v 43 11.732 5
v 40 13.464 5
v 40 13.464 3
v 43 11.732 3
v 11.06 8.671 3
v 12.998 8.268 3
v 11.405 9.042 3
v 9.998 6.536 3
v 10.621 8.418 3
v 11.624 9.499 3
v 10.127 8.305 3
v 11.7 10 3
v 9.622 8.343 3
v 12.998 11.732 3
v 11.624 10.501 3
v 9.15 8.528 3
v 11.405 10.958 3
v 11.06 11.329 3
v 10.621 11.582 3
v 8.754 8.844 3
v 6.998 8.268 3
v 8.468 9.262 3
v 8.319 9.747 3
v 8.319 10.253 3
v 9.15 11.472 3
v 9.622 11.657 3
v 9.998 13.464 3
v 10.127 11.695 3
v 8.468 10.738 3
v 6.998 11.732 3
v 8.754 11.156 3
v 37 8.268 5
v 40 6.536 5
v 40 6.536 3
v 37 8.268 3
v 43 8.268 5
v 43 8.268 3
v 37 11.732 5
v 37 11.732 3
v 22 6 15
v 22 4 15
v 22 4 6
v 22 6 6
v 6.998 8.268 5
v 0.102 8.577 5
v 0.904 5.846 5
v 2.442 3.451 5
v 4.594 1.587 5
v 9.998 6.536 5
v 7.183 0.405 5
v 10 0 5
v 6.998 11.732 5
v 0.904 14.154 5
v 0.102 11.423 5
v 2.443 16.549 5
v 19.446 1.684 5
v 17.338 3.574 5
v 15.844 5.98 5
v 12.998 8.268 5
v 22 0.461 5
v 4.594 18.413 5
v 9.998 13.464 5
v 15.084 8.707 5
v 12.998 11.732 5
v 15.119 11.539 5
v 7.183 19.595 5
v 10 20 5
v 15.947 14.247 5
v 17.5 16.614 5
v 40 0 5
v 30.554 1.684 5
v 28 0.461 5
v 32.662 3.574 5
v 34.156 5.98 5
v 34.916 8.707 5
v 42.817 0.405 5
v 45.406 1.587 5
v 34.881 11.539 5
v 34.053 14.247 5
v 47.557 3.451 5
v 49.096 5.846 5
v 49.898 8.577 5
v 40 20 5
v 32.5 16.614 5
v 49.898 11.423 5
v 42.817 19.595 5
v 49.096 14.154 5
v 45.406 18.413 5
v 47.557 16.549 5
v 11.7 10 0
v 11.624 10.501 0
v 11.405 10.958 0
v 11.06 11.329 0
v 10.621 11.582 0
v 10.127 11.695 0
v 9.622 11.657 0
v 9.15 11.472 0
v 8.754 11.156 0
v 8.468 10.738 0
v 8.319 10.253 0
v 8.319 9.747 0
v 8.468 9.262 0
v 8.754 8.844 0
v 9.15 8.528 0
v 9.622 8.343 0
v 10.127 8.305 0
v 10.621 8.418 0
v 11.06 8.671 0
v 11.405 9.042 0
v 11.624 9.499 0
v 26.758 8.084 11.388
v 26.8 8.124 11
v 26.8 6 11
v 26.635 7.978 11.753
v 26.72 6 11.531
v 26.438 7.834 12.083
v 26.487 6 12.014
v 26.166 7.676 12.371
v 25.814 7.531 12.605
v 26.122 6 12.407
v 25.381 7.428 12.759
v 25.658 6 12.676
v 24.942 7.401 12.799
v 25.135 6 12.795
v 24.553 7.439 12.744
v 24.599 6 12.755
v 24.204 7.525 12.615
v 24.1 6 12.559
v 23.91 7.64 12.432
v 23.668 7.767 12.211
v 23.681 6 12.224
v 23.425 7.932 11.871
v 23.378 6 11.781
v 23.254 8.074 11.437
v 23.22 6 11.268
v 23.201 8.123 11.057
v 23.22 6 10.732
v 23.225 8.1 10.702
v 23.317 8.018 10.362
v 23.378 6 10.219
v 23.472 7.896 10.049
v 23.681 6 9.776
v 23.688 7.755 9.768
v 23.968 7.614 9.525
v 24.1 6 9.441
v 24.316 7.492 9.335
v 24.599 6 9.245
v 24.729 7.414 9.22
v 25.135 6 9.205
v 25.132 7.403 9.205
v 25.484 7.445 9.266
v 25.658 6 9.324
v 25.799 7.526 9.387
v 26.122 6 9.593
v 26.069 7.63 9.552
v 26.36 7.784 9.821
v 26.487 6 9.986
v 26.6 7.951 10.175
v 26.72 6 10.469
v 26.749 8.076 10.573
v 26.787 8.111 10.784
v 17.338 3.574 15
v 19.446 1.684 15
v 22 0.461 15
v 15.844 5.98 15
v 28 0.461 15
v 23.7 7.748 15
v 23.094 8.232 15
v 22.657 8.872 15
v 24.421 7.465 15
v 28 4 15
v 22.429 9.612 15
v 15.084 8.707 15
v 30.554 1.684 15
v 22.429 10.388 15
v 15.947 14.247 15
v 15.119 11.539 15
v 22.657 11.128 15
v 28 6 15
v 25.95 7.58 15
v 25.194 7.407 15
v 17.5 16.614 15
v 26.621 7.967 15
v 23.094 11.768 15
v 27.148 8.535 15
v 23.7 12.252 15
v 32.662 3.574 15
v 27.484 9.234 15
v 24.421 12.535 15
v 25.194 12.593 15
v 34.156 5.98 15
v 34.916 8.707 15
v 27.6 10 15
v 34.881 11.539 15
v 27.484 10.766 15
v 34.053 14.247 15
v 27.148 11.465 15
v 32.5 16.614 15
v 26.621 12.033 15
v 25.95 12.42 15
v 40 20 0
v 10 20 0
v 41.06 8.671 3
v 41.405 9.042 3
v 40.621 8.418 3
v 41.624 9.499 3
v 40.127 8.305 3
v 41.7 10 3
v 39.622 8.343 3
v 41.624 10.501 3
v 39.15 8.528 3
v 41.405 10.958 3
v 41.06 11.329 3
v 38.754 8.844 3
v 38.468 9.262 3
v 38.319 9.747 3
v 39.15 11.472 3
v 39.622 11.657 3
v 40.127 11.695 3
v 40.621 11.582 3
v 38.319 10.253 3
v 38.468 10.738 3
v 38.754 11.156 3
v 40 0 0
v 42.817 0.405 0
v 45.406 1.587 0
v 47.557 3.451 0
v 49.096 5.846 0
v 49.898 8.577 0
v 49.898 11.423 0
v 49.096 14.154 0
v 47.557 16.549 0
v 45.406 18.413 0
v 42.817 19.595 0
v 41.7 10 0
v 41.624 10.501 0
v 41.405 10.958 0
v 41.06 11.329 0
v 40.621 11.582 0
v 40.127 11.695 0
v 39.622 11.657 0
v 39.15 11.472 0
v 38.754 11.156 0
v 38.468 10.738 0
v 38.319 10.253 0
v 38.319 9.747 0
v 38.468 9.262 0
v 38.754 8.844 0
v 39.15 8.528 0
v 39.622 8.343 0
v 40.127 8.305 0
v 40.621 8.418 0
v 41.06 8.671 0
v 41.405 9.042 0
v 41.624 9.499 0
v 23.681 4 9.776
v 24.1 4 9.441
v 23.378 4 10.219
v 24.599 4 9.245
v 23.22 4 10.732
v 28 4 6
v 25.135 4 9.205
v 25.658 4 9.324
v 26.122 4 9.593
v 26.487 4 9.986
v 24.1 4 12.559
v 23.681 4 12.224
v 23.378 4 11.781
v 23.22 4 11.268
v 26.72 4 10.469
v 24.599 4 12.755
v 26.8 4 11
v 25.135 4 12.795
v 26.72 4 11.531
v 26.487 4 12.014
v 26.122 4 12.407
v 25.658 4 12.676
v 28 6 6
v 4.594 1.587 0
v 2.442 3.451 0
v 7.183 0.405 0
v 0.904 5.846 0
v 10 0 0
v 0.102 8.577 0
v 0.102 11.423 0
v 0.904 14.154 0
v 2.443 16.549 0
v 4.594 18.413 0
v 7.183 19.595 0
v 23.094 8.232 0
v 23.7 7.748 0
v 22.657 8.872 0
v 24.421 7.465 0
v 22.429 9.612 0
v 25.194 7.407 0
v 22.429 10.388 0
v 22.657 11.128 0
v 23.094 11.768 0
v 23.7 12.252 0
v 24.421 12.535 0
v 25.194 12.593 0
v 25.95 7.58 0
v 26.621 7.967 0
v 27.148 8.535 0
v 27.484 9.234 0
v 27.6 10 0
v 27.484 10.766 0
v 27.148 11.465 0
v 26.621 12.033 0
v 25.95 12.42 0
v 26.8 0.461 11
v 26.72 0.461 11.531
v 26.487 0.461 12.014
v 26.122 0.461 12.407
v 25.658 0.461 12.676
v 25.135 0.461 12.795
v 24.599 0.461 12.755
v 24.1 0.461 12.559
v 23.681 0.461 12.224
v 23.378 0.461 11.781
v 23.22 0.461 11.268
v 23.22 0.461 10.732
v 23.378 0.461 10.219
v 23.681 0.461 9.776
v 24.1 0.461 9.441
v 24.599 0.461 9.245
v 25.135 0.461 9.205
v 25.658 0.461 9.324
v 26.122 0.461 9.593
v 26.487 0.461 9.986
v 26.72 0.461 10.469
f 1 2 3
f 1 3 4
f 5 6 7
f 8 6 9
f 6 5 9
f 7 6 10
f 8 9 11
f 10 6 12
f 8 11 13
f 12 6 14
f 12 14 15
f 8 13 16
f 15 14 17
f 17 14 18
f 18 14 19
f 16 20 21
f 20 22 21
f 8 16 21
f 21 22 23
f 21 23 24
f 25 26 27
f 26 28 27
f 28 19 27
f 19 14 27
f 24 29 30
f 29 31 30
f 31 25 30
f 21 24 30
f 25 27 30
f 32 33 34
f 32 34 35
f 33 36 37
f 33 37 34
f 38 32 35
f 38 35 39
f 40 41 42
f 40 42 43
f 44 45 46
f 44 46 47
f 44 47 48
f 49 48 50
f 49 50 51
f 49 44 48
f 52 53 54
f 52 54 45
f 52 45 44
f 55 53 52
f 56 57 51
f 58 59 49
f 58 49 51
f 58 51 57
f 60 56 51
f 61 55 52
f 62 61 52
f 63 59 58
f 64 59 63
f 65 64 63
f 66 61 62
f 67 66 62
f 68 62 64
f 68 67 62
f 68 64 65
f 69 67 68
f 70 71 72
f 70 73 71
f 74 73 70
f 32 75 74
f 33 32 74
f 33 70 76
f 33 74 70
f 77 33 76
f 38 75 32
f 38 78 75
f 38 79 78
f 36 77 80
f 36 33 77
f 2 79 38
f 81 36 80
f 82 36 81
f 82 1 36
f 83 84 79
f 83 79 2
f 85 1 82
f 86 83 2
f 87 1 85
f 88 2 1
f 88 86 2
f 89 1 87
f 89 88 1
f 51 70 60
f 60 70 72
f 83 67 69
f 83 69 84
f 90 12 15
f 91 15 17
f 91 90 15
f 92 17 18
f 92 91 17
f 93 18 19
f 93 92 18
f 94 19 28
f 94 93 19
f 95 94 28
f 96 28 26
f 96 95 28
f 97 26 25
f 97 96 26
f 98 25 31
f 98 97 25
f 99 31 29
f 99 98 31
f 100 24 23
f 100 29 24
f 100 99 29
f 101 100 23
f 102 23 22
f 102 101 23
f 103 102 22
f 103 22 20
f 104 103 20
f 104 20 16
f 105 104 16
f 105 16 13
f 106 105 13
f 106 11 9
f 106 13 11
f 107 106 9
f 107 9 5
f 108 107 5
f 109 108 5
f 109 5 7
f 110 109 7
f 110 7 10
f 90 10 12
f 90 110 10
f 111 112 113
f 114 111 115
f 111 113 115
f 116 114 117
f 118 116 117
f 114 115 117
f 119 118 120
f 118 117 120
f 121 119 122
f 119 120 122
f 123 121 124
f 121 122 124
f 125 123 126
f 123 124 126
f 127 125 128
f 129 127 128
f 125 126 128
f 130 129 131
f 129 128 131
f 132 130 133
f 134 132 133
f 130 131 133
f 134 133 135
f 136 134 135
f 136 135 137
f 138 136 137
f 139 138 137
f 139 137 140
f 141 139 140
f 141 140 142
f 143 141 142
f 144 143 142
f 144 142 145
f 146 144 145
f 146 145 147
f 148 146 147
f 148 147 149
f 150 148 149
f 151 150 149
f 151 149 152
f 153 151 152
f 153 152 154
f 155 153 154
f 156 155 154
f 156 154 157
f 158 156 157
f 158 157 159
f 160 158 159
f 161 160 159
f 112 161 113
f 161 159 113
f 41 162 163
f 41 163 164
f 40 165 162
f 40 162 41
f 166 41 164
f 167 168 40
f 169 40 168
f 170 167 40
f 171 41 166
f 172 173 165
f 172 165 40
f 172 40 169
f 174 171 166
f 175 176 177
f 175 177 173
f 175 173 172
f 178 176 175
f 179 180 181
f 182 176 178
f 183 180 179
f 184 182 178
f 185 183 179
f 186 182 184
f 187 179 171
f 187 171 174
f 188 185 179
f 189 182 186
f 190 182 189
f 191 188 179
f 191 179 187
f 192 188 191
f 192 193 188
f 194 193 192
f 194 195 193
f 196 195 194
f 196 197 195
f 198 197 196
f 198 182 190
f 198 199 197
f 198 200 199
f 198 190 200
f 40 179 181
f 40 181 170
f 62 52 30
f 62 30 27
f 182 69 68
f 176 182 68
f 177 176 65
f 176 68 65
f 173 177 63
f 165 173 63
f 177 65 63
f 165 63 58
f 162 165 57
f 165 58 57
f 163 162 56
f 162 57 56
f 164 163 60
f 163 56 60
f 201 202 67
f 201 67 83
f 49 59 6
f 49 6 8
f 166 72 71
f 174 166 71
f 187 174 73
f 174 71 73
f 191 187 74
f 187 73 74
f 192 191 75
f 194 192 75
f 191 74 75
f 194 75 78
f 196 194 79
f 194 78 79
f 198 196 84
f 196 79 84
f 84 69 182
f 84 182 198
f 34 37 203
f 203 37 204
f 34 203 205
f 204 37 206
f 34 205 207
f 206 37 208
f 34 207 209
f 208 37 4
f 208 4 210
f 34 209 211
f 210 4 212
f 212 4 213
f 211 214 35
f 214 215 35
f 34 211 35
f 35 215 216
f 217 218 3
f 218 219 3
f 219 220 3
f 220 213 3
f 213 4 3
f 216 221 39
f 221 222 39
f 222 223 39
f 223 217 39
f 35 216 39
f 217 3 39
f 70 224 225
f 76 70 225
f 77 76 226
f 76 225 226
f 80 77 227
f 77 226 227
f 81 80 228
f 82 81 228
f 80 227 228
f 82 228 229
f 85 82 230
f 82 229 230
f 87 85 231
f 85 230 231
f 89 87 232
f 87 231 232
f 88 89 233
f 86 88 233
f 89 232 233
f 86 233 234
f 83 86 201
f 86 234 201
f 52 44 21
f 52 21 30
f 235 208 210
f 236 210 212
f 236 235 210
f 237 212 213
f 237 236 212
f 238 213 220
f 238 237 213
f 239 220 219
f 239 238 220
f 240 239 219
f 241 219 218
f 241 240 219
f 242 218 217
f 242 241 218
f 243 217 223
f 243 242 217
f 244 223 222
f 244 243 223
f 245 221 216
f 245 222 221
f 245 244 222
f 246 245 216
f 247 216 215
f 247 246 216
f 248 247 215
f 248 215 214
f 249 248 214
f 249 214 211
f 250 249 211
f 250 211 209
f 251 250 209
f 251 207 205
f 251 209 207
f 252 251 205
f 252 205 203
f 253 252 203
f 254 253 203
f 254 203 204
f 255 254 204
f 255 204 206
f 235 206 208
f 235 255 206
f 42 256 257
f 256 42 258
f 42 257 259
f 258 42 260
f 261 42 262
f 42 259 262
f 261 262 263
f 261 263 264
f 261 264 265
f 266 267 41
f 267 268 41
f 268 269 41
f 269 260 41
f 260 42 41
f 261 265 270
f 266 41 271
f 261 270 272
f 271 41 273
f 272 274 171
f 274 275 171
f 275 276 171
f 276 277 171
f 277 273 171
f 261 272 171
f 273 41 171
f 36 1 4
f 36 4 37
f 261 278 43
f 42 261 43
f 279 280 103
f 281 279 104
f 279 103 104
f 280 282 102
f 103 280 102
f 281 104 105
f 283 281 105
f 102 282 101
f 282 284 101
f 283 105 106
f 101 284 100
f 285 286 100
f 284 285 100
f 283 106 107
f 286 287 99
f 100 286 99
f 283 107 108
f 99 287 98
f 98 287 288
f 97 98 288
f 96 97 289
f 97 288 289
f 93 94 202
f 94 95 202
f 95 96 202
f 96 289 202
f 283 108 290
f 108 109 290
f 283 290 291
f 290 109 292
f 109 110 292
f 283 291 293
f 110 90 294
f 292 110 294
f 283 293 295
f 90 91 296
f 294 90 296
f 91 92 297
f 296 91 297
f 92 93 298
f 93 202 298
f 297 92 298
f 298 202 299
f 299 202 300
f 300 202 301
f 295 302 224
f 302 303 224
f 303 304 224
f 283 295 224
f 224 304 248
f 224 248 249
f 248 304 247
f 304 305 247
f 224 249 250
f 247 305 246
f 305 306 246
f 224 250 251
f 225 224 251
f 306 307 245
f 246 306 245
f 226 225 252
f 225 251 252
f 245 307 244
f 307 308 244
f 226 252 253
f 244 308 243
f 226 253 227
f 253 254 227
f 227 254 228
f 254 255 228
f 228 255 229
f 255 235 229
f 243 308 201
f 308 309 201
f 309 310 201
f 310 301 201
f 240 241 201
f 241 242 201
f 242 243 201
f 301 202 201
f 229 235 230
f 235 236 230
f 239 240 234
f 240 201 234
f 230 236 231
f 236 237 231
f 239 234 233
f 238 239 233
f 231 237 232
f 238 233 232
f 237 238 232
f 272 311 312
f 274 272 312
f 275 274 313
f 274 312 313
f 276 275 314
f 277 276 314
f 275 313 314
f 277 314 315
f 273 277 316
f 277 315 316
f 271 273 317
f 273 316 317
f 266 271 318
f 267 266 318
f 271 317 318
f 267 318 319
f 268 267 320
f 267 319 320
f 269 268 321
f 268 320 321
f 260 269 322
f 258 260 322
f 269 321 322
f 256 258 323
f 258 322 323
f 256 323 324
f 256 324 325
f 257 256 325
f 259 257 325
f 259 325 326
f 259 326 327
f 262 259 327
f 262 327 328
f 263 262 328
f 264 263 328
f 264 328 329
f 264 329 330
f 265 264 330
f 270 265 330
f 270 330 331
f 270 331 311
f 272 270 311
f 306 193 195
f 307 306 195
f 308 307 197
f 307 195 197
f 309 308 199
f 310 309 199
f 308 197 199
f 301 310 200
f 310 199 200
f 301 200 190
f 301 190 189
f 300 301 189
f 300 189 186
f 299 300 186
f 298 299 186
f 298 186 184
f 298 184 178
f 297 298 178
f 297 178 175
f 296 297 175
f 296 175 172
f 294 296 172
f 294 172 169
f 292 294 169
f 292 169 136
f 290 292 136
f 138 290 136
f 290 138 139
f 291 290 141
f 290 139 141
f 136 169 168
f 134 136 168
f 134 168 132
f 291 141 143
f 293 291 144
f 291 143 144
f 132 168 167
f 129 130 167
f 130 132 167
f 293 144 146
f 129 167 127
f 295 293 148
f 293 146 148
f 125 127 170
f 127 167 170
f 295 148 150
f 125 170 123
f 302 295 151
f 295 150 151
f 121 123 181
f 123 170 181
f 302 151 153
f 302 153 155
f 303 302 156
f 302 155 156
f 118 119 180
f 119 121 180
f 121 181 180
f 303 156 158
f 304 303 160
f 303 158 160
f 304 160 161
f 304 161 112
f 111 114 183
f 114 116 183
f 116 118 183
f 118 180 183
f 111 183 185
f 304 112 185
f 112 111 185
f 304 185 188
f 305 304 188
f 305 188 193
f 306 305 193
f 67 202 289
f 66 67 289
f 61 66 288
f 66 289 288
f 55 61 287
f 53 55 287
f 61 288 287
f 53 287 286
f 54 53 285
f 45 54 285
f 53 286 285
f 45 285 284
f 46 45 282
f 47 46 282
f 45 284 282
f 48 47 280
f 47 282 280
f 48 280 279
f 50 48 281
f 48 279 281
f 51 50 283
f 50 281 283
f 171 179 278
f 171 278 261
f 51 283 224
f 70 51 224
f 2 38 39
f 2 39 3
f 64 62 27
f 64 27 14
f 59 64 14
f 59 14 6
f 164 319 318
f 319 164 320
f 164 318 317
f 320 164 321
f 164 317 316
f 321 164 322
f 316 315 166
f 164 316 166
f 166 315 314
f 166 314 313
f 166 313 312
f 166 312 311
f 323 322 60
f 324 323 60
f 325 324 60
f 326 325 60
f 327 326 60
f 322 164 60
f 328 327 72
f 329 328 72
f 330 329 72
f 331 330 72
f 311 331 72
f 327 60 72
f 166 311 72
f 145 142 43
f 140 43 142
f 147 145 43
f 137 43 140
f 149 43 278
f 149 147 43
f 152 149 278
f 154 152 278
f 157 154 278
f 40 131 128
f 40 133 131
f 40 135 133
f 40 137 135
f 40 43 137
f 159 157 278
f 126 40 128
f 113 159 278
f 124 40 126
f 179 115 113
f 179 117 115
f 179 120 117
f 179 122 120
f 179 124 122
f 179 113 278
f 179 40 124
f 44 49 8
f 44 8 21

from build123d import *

# Parameters (mm, degrees)
SKETCH_R        = 1.7
PAD_DEPTH       = 5
PAD001_DEPTH    = 10
SKETCH002_R     = 2.6
POCKET_DEPTH    = 15
POCKET001_DEPTH = 9
SKETCH004_R     = 1.8
POCKET002_DEPTH = 8
POCKET003_DEPTH = 2


with BuildPart() as part:
    # Sketch → Pad (new body)
    with BuildSketch(Plane.XY):
        with BuildLine():
            ThreePointArc((10, 20), (0, 10.000015), (9.99997, 0))
            Line((9.99997, 0), (39.99997, 0))
            ThreePointArc((39.99997, 0), (49.999939, 10.000015), (39.999939, 20))
            Line((10, 20), (39.999939, 20))
        make_face()
        with Locations((39.999939, 10)):
            Circle(SKETCH_R, mode=Mode.SUBTRACT)
        with Locations((10, 10)):
            Circle(SKETCH_R, mode=Mode.SUBTRACT)
    extrude(amount=PAD_DEPTH)

    # Sketch001 → Pad001 (new body)
    with BuildSketch(Plane.XY.offset(5)):
        with BuildLine():
            ThreePointArc((28, 0.460608), (34.633202, 7.316453), (32.5, 16.614378))
            Line((17.5, 16.614378), (32.5, 16.614378))
            ThreePointArc((17.5, 16.614378), (15.366798, 7.316453), (22, 0.460608))
            Line((22, 0.460608), (28, 0.460608))
        make_face()
    extrude(amount=PAD001_DEPTH)

    # Sketch002 → Pocket (cut)
    with BuildSketch(Plane.XY.offset(15)):
        with Locations((25, 10)):
            Circle(SKETCH002_R)
    extrude(amount=-POCKET_DEPTH, mode=Mode.SUBTRACT)

    # Sketch003 → Pocket001 (cut)
    with BuildSketch(Plane.XY.offset(15)):
        Polygon((22, 6), (28, 6), (28, 4), (25, 4), (22, 4), align=None)
    extrude(amount=-POCKET001_DEPTH, mode=Mode.SUBTRACT)

    # Sketch004 → Pocket002 (cut)
    with BuildSketch(Plane.XZ.offset(-0.460608)):
        with Locations((25, 11)):
            Circle(SKETCH004_R)
    extrude(amount=-POCKET002_DEPTH, mode=Mode.SUBTRACT)

    # Sketch005 → Pocket003 (cut)
    with BuildSketch(Plane.XY.offset(5)):
        Polygon((6.998384, 8.267949), (6.998384, 11.732051), (9.998384, 13.464102), (12.998384, 11.732051), (12.998384, 8.267949), (9.998384, 6.535898), align=None)
        Polygon((39.999999, 13.464101), (43, 11.732051), (43, 8.267949), (40, 6.535897), (37, 8.267948), (37, 11.73205), align=None)
    extrude(amount=-POCKET003_DEPTH, mode=Mode.SUBTRACT)


solid = part.part
